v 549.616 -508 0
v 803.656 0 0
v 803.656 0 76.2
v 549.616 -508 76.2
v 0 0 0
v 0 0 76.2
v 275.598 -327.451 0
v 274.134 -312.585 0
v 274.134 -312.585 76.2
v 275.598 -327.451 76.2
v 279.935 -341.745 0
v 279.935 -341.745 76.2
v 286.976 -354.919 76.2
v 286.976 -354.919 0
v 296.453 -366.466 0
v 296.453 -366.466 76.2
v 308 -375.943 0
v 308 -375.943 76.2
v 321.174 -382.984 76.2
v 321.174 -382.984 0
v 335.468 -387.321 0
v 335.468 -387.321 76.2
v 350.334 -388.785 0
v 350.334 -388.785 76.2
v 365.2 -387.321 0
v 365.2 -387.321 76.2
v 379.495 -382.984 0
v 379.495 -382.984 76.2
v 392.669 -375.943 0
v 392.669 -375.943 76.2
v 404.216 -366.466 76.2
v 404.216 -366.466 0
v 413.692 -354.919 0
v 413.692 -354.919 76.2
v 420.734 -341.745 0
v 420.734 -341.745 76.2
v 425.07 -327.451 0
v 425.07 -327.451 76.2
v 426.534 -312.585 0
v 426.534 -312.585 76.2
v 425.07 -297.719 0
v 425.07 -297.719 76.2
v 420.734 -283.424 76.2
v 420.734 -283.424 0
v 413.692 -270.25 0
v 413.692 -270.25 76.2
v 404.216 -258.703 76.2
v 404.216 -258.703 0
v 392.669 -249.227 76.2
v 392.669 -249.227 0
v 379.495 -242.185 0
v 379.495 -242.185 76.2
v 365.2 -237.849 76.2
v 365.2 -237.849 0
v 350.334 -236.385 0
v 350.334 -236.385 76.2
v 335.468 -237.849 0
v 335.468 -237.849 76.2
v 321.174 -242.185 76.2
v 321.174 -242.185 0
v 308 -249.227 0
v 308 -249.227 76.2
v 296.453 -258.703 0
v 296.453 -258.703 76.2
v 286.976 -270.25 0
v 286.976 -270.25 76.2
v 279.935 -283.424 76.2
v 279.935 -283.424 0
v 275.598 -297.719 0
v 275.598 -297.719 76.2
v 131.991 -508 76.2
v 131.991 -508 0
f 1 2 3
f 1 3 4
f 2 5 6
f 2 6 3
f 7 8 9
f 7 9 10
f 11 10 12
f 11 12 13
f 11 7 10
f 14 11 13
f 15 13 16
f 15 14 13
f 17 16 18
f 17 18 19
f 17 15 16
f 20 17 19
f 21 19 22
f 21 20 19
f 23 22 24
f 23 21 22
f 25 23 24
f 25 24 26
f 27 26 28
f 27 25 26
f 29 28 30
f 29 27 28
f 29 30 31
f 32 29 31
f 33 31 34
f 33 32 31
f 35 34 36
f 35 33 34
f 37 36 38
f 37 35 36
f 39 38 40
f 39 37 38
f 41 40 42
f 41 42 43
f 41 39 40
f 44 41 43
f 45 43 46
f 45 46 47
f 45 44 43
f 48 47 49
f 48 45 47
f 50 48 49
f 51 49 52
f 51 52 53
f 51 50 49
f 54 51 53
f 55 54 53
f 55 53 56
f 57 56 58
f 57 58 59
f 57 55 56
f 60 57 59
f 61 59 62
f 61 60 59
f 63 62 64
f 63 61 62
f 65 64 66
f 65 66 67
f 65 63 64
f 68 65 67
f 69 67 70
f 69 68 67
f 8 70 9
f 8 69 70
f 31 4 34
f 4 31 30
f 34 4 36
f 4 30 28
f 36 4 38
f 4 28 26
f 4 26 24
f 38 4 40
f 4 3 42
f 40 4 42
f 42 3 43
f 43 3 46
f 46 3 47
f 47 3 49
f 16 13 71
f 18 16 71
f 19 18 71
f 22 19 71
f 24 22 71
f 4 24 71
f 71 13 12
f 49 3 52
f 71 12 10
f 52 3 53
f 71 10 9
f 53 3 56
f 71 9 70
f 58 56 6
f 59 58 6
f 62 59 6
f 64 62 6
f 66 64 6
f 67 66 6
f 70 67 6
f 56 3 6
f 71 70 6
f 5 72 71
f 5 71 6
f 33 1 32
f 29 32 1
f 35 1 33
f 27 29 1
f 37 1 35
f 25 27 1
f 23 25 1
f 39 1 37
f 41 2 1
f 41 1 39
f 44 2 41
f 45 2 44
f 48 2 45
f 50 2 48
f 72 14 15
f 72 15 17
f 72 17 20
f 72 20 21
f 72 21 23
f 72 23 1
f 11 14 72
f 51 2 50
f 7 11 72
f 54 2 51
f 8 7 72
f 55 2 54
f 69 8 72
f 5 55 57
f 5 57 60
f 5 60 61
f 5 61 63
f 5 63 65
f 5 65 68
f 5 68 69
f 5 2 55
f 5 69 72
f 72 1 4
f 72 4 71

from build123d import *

# Parameters (mm, degrees)
SKETCH2_R           = 76.2
BOSS_EXTRUDE2_DEPTH = 76.2


with BuildPart() as part:
    # Sketch2 → Boss-Extrude2 (new body)
    with BuildSketch(Plane.XY):
        Polygon((0, 0), (803.656, 0), (549.615688221, -508), (131.991038362, -508), align=None)
        with Locations(Location((350.334210966, -312.584818641, 0), (0, 0, 180))):
            Circle(SKETCH2_R, mode=Mode.SUBTRACT)
    extrude(amount=BOSS_EXTRUDE2_DEPTH)


solid = part.part
